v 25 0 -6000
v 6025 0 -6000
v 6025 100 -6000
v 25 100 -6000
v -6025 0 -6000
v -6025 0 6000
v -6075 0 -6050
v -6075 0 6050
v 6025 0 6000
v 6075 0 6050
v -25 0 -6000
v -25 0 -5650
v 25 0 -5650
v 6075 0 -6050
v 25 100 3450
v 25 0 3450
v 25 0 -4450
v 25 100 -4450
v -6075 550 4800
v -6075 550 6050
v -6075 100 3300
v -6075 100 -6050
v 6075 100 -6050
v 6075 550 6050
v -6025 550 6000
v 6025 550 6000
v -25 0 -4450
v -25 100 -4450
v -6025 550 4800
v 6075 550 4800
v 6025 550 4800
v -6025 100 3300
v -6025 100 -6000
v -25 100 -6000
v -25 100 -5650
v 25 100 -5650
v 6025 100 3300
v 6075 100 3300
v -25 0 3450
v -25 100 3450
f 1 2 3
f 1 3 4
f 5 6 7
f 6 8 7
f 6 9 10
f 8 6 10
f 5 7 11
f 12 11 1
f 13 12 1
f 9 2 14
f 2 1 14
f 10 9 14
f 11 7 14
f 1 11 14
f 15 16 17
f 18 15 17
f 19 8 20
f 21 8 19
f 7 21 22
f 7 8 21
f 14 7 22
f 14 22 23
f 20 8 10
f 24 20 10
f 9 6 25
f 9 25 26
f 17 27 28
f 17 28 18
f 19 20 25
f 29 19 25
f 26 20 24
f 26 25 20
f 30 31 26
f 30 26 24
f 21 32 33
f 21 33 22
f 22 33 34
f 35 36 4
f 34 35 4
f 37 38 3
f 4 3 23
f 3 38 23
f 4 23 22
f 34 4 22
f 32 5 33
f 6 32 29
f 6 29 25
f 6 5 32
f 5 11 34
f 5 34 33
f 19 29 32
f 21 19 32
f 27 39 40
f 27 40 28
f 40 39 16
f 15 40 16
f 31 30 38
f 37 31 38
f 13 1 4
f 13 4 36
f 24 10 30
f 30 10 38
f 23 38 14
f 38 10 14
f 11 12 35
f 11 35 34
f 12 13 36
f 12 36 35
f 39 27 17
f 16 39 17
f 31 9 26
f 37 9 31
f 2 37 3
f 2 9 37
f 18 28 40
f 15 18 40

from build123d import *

# Parameters (mm, degrees)
SKETCH_1_W          = 12150
SKETCH_1_H          = 12100
EXTRUDE_1_DEPTH     = 550
SKETCH_1_W_2        = 50
SKETCH_1_H_2        = 7900
EXTRUDE_1_2_DEPTH   = 550
CUT_EXTRUDE_1_DEPTH = 13585.089958477
SKETCH_3_W          = 7900
SKETCH_3_H          = 450
CUT_EXTRUDE_2_DEPTH = 8610.006911369


with BuildPart() as part:
    # 草图1 → 凸台-拉伸1 (new body)
    with BuildSketch(Plane(origin=(0, 0, 0), x_dir=(1, 0, 0), z_dir=(0, 1, 0))):
        Rectangle(SKETCH_1_W, SKETCH_1_H)
        Polygon((6025, -6000), (6025, 6000), (25, 6000), (25, 5650), (-25, 5650), (-25, 6000), (-6025, 6000), (-6025, -6000), align=None, mode=Mode.SUBTRACT)
    extrude(amount=EXTRUDE_1_DEPTH)

    # 草图2 → 切除-拉伸1 (cut, through all)
    with BuildSketch(Plane(origin=(6075, 0, 0), x_dir=(0, 0, -1), z_dir=(1, 0, 0))):
        Polygon((-4800, 550), (-3300, 100), (6050, 100), (6050, 550), align=None)
    extrude(amount=-CUT_EXTRUDE_1_DEPTH, mode=Mode.SUBTRACT)


with BuildPart() as body_2:
    # 草图1 → Extrude 1 2 (new body)
    with BuildSketch(Plane(origin=(0, 0, 0), x_dir=(1, 0, 0), z_dir=(0, 1, 0))):
        with Locations((0, 500)):
            Rectangle(SKETCH_1_W_2, SKETCH_1_H_2)
    extrude(amount=EXTRUDE_1_2_DEPTH)

    # 草图3 → 切除-拉伸2 (cut, through all)
    with BuildSketch(Plane.ZY.offset(25)):
        with Locations((-500, 325)):
            Rectangle(SKETCH_3_W, SKETCH_3_H)
    extrude(amount=-CUT_EXTRUDE_2_DEPTH, mode=Mode.SUBTRACT)


solid = Compound([part.part, body_2.part])
